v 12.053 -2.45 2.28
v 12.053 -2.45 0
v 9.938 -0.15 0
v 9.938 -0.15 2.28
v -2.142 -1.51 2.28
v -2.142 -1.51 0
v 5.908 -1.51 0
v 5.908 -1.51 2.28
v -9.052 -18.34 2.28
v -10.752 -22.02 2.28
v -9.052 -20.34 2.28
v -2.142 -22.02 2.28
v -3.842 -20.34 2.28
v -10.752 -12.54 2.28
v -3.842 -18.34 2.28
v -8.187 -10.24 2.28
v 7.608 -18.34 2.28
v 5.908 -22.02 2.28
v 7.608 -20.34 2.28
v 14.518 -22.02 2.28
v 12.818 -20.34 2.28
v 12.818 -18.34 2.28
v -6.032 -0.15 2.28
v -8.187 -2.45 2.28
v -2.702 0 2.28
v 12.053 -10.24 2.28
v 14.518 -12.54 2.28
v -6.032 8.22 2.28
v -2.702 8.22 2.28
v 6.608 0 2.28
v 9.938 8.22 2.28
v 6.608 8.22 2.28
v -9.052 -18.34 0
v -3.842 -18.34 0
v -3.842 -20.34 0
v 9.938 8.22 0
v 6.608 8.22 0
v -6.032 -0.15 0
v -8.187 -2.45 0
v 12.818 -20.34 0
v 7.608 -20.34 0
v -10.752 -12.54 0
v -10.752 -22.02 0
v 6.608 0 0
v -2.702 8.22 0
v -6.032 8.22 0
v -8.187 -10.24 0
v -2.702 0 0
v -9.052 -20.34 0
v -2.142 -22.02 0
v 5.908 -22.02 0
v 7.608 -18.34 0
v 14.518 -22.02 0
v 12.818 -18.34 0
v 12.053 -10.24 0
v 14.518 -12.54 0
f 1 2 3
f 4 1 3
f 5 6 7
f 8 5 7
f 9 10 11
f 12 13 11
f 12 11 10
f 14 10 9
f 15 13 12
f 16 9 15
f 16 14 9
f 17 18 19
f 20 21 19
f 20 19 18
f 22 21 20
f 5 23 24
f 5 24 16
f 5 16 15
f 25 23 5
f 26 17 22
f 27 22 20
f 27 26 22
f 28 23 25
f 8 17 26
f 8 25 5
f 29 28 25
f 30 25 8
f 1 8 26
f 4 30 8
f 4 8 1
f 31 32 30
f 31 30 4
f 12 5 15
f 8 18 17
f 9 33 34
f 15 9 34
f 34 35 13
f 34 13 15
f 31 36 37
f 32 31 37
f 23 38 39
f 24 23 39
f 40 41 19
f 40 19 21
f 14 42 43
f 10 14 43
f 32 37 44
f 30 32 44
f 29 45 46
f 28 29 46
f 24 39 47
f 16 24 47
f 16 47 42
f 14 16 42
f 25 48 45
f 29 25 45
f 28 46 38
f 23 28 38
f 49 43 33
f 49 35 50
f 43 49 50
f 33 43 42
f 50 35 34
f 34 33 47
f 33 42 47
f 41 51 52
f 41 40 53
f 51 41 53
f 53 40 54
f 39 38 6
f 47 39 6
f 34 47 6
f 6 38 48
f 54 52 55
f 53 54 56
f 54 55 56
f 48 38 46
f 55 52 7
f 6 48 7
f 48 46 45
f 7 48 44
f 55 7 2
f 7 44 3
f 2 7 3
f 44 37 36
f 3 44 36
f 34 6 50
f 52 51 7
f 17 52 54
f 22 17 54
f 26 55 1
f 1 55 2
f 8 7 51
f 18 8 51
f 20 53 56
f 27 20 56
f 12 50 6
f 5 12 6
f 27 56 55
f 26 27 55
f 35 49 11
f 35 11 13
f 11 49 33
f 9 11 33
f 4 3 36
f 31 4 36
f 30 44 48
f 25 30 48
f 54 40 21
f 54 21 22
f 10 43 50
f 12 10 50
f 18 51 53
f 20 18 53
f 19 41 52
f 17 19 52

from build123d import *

# Parameters (mm, degrees)
F0_W     = 5.21
F0_H     = 2
F1_DEPTH = 2.28


with BuildPart() as f1:
    # F0 (on Top) → F1 (new body)
    with BuildSketch(Plane.XY):
        Polygon((12.053386, -12.54), (5.908386, -12.54), (5.908386, -22.02), (14.518386, -22.02), (14.518386, -12.54), align=None)
        with Locations((10.213386, -19.34)):
            Rectangle(F0_W, F0_H, mode=Mode.SUBTRACT)
        Polygon((-2.141614, -22.02), (-2.141614, -12.54), (-8.186614, -12.54), (-10.751614, -12.54), (-10.751614, -22.02), align=None)
        with Locations((-6.446614, -19.34)):
            Rectangle(F0_W, F0_H, mode=Mode.SUBTRACT)
        Polygon((-8.186614, -12.54), (-8.186614, -10.24), (-10.751614, -12.54), align=None)
        Polygon((-2.141614, -2.45), (-6.031614, -2.45), (-8.186614, -2.45), (-8.186614, -10.24), (-8.186614, -12.54), (-2.141614, -12.54), align=None)
        Polygon((-6.031614, -2.45), (-6.031614, -0.15), (-8.186614, -2.45), align=None)
        Polygon((6.608386, 0), (-2.701614, 0), (-2.701614, 8.22), (-6.031614, 8.22), (-6.031614, -0.15), (-6.031614, -2.45), (-2.141614, -2.45), (-2.141614, -1.51), (5.908386, -1.51), (5.908386, -2.45), (9.938386, -2.45), (9.938386, -0.15), (9.938386, 8.22), (6.608386, 8.22), align=None)
        Polygon((12.053386, -2.45), (9.938386, -2.45), (5.908386, -2.45), (5.908386, -12.54), (12.053386, -12.54), (12.053386, -10.24), align=None)
        Polygon((12.053386, -2.45), (9.938386, -0.15), (9.938386, -2.45), align=None)
        Polygon((14.518386, -12.54), (12.053386, -10.24), (12.053386, -12.54), align=None)
    extrude(amount=F1_DEPTH)


solid = f1.part
